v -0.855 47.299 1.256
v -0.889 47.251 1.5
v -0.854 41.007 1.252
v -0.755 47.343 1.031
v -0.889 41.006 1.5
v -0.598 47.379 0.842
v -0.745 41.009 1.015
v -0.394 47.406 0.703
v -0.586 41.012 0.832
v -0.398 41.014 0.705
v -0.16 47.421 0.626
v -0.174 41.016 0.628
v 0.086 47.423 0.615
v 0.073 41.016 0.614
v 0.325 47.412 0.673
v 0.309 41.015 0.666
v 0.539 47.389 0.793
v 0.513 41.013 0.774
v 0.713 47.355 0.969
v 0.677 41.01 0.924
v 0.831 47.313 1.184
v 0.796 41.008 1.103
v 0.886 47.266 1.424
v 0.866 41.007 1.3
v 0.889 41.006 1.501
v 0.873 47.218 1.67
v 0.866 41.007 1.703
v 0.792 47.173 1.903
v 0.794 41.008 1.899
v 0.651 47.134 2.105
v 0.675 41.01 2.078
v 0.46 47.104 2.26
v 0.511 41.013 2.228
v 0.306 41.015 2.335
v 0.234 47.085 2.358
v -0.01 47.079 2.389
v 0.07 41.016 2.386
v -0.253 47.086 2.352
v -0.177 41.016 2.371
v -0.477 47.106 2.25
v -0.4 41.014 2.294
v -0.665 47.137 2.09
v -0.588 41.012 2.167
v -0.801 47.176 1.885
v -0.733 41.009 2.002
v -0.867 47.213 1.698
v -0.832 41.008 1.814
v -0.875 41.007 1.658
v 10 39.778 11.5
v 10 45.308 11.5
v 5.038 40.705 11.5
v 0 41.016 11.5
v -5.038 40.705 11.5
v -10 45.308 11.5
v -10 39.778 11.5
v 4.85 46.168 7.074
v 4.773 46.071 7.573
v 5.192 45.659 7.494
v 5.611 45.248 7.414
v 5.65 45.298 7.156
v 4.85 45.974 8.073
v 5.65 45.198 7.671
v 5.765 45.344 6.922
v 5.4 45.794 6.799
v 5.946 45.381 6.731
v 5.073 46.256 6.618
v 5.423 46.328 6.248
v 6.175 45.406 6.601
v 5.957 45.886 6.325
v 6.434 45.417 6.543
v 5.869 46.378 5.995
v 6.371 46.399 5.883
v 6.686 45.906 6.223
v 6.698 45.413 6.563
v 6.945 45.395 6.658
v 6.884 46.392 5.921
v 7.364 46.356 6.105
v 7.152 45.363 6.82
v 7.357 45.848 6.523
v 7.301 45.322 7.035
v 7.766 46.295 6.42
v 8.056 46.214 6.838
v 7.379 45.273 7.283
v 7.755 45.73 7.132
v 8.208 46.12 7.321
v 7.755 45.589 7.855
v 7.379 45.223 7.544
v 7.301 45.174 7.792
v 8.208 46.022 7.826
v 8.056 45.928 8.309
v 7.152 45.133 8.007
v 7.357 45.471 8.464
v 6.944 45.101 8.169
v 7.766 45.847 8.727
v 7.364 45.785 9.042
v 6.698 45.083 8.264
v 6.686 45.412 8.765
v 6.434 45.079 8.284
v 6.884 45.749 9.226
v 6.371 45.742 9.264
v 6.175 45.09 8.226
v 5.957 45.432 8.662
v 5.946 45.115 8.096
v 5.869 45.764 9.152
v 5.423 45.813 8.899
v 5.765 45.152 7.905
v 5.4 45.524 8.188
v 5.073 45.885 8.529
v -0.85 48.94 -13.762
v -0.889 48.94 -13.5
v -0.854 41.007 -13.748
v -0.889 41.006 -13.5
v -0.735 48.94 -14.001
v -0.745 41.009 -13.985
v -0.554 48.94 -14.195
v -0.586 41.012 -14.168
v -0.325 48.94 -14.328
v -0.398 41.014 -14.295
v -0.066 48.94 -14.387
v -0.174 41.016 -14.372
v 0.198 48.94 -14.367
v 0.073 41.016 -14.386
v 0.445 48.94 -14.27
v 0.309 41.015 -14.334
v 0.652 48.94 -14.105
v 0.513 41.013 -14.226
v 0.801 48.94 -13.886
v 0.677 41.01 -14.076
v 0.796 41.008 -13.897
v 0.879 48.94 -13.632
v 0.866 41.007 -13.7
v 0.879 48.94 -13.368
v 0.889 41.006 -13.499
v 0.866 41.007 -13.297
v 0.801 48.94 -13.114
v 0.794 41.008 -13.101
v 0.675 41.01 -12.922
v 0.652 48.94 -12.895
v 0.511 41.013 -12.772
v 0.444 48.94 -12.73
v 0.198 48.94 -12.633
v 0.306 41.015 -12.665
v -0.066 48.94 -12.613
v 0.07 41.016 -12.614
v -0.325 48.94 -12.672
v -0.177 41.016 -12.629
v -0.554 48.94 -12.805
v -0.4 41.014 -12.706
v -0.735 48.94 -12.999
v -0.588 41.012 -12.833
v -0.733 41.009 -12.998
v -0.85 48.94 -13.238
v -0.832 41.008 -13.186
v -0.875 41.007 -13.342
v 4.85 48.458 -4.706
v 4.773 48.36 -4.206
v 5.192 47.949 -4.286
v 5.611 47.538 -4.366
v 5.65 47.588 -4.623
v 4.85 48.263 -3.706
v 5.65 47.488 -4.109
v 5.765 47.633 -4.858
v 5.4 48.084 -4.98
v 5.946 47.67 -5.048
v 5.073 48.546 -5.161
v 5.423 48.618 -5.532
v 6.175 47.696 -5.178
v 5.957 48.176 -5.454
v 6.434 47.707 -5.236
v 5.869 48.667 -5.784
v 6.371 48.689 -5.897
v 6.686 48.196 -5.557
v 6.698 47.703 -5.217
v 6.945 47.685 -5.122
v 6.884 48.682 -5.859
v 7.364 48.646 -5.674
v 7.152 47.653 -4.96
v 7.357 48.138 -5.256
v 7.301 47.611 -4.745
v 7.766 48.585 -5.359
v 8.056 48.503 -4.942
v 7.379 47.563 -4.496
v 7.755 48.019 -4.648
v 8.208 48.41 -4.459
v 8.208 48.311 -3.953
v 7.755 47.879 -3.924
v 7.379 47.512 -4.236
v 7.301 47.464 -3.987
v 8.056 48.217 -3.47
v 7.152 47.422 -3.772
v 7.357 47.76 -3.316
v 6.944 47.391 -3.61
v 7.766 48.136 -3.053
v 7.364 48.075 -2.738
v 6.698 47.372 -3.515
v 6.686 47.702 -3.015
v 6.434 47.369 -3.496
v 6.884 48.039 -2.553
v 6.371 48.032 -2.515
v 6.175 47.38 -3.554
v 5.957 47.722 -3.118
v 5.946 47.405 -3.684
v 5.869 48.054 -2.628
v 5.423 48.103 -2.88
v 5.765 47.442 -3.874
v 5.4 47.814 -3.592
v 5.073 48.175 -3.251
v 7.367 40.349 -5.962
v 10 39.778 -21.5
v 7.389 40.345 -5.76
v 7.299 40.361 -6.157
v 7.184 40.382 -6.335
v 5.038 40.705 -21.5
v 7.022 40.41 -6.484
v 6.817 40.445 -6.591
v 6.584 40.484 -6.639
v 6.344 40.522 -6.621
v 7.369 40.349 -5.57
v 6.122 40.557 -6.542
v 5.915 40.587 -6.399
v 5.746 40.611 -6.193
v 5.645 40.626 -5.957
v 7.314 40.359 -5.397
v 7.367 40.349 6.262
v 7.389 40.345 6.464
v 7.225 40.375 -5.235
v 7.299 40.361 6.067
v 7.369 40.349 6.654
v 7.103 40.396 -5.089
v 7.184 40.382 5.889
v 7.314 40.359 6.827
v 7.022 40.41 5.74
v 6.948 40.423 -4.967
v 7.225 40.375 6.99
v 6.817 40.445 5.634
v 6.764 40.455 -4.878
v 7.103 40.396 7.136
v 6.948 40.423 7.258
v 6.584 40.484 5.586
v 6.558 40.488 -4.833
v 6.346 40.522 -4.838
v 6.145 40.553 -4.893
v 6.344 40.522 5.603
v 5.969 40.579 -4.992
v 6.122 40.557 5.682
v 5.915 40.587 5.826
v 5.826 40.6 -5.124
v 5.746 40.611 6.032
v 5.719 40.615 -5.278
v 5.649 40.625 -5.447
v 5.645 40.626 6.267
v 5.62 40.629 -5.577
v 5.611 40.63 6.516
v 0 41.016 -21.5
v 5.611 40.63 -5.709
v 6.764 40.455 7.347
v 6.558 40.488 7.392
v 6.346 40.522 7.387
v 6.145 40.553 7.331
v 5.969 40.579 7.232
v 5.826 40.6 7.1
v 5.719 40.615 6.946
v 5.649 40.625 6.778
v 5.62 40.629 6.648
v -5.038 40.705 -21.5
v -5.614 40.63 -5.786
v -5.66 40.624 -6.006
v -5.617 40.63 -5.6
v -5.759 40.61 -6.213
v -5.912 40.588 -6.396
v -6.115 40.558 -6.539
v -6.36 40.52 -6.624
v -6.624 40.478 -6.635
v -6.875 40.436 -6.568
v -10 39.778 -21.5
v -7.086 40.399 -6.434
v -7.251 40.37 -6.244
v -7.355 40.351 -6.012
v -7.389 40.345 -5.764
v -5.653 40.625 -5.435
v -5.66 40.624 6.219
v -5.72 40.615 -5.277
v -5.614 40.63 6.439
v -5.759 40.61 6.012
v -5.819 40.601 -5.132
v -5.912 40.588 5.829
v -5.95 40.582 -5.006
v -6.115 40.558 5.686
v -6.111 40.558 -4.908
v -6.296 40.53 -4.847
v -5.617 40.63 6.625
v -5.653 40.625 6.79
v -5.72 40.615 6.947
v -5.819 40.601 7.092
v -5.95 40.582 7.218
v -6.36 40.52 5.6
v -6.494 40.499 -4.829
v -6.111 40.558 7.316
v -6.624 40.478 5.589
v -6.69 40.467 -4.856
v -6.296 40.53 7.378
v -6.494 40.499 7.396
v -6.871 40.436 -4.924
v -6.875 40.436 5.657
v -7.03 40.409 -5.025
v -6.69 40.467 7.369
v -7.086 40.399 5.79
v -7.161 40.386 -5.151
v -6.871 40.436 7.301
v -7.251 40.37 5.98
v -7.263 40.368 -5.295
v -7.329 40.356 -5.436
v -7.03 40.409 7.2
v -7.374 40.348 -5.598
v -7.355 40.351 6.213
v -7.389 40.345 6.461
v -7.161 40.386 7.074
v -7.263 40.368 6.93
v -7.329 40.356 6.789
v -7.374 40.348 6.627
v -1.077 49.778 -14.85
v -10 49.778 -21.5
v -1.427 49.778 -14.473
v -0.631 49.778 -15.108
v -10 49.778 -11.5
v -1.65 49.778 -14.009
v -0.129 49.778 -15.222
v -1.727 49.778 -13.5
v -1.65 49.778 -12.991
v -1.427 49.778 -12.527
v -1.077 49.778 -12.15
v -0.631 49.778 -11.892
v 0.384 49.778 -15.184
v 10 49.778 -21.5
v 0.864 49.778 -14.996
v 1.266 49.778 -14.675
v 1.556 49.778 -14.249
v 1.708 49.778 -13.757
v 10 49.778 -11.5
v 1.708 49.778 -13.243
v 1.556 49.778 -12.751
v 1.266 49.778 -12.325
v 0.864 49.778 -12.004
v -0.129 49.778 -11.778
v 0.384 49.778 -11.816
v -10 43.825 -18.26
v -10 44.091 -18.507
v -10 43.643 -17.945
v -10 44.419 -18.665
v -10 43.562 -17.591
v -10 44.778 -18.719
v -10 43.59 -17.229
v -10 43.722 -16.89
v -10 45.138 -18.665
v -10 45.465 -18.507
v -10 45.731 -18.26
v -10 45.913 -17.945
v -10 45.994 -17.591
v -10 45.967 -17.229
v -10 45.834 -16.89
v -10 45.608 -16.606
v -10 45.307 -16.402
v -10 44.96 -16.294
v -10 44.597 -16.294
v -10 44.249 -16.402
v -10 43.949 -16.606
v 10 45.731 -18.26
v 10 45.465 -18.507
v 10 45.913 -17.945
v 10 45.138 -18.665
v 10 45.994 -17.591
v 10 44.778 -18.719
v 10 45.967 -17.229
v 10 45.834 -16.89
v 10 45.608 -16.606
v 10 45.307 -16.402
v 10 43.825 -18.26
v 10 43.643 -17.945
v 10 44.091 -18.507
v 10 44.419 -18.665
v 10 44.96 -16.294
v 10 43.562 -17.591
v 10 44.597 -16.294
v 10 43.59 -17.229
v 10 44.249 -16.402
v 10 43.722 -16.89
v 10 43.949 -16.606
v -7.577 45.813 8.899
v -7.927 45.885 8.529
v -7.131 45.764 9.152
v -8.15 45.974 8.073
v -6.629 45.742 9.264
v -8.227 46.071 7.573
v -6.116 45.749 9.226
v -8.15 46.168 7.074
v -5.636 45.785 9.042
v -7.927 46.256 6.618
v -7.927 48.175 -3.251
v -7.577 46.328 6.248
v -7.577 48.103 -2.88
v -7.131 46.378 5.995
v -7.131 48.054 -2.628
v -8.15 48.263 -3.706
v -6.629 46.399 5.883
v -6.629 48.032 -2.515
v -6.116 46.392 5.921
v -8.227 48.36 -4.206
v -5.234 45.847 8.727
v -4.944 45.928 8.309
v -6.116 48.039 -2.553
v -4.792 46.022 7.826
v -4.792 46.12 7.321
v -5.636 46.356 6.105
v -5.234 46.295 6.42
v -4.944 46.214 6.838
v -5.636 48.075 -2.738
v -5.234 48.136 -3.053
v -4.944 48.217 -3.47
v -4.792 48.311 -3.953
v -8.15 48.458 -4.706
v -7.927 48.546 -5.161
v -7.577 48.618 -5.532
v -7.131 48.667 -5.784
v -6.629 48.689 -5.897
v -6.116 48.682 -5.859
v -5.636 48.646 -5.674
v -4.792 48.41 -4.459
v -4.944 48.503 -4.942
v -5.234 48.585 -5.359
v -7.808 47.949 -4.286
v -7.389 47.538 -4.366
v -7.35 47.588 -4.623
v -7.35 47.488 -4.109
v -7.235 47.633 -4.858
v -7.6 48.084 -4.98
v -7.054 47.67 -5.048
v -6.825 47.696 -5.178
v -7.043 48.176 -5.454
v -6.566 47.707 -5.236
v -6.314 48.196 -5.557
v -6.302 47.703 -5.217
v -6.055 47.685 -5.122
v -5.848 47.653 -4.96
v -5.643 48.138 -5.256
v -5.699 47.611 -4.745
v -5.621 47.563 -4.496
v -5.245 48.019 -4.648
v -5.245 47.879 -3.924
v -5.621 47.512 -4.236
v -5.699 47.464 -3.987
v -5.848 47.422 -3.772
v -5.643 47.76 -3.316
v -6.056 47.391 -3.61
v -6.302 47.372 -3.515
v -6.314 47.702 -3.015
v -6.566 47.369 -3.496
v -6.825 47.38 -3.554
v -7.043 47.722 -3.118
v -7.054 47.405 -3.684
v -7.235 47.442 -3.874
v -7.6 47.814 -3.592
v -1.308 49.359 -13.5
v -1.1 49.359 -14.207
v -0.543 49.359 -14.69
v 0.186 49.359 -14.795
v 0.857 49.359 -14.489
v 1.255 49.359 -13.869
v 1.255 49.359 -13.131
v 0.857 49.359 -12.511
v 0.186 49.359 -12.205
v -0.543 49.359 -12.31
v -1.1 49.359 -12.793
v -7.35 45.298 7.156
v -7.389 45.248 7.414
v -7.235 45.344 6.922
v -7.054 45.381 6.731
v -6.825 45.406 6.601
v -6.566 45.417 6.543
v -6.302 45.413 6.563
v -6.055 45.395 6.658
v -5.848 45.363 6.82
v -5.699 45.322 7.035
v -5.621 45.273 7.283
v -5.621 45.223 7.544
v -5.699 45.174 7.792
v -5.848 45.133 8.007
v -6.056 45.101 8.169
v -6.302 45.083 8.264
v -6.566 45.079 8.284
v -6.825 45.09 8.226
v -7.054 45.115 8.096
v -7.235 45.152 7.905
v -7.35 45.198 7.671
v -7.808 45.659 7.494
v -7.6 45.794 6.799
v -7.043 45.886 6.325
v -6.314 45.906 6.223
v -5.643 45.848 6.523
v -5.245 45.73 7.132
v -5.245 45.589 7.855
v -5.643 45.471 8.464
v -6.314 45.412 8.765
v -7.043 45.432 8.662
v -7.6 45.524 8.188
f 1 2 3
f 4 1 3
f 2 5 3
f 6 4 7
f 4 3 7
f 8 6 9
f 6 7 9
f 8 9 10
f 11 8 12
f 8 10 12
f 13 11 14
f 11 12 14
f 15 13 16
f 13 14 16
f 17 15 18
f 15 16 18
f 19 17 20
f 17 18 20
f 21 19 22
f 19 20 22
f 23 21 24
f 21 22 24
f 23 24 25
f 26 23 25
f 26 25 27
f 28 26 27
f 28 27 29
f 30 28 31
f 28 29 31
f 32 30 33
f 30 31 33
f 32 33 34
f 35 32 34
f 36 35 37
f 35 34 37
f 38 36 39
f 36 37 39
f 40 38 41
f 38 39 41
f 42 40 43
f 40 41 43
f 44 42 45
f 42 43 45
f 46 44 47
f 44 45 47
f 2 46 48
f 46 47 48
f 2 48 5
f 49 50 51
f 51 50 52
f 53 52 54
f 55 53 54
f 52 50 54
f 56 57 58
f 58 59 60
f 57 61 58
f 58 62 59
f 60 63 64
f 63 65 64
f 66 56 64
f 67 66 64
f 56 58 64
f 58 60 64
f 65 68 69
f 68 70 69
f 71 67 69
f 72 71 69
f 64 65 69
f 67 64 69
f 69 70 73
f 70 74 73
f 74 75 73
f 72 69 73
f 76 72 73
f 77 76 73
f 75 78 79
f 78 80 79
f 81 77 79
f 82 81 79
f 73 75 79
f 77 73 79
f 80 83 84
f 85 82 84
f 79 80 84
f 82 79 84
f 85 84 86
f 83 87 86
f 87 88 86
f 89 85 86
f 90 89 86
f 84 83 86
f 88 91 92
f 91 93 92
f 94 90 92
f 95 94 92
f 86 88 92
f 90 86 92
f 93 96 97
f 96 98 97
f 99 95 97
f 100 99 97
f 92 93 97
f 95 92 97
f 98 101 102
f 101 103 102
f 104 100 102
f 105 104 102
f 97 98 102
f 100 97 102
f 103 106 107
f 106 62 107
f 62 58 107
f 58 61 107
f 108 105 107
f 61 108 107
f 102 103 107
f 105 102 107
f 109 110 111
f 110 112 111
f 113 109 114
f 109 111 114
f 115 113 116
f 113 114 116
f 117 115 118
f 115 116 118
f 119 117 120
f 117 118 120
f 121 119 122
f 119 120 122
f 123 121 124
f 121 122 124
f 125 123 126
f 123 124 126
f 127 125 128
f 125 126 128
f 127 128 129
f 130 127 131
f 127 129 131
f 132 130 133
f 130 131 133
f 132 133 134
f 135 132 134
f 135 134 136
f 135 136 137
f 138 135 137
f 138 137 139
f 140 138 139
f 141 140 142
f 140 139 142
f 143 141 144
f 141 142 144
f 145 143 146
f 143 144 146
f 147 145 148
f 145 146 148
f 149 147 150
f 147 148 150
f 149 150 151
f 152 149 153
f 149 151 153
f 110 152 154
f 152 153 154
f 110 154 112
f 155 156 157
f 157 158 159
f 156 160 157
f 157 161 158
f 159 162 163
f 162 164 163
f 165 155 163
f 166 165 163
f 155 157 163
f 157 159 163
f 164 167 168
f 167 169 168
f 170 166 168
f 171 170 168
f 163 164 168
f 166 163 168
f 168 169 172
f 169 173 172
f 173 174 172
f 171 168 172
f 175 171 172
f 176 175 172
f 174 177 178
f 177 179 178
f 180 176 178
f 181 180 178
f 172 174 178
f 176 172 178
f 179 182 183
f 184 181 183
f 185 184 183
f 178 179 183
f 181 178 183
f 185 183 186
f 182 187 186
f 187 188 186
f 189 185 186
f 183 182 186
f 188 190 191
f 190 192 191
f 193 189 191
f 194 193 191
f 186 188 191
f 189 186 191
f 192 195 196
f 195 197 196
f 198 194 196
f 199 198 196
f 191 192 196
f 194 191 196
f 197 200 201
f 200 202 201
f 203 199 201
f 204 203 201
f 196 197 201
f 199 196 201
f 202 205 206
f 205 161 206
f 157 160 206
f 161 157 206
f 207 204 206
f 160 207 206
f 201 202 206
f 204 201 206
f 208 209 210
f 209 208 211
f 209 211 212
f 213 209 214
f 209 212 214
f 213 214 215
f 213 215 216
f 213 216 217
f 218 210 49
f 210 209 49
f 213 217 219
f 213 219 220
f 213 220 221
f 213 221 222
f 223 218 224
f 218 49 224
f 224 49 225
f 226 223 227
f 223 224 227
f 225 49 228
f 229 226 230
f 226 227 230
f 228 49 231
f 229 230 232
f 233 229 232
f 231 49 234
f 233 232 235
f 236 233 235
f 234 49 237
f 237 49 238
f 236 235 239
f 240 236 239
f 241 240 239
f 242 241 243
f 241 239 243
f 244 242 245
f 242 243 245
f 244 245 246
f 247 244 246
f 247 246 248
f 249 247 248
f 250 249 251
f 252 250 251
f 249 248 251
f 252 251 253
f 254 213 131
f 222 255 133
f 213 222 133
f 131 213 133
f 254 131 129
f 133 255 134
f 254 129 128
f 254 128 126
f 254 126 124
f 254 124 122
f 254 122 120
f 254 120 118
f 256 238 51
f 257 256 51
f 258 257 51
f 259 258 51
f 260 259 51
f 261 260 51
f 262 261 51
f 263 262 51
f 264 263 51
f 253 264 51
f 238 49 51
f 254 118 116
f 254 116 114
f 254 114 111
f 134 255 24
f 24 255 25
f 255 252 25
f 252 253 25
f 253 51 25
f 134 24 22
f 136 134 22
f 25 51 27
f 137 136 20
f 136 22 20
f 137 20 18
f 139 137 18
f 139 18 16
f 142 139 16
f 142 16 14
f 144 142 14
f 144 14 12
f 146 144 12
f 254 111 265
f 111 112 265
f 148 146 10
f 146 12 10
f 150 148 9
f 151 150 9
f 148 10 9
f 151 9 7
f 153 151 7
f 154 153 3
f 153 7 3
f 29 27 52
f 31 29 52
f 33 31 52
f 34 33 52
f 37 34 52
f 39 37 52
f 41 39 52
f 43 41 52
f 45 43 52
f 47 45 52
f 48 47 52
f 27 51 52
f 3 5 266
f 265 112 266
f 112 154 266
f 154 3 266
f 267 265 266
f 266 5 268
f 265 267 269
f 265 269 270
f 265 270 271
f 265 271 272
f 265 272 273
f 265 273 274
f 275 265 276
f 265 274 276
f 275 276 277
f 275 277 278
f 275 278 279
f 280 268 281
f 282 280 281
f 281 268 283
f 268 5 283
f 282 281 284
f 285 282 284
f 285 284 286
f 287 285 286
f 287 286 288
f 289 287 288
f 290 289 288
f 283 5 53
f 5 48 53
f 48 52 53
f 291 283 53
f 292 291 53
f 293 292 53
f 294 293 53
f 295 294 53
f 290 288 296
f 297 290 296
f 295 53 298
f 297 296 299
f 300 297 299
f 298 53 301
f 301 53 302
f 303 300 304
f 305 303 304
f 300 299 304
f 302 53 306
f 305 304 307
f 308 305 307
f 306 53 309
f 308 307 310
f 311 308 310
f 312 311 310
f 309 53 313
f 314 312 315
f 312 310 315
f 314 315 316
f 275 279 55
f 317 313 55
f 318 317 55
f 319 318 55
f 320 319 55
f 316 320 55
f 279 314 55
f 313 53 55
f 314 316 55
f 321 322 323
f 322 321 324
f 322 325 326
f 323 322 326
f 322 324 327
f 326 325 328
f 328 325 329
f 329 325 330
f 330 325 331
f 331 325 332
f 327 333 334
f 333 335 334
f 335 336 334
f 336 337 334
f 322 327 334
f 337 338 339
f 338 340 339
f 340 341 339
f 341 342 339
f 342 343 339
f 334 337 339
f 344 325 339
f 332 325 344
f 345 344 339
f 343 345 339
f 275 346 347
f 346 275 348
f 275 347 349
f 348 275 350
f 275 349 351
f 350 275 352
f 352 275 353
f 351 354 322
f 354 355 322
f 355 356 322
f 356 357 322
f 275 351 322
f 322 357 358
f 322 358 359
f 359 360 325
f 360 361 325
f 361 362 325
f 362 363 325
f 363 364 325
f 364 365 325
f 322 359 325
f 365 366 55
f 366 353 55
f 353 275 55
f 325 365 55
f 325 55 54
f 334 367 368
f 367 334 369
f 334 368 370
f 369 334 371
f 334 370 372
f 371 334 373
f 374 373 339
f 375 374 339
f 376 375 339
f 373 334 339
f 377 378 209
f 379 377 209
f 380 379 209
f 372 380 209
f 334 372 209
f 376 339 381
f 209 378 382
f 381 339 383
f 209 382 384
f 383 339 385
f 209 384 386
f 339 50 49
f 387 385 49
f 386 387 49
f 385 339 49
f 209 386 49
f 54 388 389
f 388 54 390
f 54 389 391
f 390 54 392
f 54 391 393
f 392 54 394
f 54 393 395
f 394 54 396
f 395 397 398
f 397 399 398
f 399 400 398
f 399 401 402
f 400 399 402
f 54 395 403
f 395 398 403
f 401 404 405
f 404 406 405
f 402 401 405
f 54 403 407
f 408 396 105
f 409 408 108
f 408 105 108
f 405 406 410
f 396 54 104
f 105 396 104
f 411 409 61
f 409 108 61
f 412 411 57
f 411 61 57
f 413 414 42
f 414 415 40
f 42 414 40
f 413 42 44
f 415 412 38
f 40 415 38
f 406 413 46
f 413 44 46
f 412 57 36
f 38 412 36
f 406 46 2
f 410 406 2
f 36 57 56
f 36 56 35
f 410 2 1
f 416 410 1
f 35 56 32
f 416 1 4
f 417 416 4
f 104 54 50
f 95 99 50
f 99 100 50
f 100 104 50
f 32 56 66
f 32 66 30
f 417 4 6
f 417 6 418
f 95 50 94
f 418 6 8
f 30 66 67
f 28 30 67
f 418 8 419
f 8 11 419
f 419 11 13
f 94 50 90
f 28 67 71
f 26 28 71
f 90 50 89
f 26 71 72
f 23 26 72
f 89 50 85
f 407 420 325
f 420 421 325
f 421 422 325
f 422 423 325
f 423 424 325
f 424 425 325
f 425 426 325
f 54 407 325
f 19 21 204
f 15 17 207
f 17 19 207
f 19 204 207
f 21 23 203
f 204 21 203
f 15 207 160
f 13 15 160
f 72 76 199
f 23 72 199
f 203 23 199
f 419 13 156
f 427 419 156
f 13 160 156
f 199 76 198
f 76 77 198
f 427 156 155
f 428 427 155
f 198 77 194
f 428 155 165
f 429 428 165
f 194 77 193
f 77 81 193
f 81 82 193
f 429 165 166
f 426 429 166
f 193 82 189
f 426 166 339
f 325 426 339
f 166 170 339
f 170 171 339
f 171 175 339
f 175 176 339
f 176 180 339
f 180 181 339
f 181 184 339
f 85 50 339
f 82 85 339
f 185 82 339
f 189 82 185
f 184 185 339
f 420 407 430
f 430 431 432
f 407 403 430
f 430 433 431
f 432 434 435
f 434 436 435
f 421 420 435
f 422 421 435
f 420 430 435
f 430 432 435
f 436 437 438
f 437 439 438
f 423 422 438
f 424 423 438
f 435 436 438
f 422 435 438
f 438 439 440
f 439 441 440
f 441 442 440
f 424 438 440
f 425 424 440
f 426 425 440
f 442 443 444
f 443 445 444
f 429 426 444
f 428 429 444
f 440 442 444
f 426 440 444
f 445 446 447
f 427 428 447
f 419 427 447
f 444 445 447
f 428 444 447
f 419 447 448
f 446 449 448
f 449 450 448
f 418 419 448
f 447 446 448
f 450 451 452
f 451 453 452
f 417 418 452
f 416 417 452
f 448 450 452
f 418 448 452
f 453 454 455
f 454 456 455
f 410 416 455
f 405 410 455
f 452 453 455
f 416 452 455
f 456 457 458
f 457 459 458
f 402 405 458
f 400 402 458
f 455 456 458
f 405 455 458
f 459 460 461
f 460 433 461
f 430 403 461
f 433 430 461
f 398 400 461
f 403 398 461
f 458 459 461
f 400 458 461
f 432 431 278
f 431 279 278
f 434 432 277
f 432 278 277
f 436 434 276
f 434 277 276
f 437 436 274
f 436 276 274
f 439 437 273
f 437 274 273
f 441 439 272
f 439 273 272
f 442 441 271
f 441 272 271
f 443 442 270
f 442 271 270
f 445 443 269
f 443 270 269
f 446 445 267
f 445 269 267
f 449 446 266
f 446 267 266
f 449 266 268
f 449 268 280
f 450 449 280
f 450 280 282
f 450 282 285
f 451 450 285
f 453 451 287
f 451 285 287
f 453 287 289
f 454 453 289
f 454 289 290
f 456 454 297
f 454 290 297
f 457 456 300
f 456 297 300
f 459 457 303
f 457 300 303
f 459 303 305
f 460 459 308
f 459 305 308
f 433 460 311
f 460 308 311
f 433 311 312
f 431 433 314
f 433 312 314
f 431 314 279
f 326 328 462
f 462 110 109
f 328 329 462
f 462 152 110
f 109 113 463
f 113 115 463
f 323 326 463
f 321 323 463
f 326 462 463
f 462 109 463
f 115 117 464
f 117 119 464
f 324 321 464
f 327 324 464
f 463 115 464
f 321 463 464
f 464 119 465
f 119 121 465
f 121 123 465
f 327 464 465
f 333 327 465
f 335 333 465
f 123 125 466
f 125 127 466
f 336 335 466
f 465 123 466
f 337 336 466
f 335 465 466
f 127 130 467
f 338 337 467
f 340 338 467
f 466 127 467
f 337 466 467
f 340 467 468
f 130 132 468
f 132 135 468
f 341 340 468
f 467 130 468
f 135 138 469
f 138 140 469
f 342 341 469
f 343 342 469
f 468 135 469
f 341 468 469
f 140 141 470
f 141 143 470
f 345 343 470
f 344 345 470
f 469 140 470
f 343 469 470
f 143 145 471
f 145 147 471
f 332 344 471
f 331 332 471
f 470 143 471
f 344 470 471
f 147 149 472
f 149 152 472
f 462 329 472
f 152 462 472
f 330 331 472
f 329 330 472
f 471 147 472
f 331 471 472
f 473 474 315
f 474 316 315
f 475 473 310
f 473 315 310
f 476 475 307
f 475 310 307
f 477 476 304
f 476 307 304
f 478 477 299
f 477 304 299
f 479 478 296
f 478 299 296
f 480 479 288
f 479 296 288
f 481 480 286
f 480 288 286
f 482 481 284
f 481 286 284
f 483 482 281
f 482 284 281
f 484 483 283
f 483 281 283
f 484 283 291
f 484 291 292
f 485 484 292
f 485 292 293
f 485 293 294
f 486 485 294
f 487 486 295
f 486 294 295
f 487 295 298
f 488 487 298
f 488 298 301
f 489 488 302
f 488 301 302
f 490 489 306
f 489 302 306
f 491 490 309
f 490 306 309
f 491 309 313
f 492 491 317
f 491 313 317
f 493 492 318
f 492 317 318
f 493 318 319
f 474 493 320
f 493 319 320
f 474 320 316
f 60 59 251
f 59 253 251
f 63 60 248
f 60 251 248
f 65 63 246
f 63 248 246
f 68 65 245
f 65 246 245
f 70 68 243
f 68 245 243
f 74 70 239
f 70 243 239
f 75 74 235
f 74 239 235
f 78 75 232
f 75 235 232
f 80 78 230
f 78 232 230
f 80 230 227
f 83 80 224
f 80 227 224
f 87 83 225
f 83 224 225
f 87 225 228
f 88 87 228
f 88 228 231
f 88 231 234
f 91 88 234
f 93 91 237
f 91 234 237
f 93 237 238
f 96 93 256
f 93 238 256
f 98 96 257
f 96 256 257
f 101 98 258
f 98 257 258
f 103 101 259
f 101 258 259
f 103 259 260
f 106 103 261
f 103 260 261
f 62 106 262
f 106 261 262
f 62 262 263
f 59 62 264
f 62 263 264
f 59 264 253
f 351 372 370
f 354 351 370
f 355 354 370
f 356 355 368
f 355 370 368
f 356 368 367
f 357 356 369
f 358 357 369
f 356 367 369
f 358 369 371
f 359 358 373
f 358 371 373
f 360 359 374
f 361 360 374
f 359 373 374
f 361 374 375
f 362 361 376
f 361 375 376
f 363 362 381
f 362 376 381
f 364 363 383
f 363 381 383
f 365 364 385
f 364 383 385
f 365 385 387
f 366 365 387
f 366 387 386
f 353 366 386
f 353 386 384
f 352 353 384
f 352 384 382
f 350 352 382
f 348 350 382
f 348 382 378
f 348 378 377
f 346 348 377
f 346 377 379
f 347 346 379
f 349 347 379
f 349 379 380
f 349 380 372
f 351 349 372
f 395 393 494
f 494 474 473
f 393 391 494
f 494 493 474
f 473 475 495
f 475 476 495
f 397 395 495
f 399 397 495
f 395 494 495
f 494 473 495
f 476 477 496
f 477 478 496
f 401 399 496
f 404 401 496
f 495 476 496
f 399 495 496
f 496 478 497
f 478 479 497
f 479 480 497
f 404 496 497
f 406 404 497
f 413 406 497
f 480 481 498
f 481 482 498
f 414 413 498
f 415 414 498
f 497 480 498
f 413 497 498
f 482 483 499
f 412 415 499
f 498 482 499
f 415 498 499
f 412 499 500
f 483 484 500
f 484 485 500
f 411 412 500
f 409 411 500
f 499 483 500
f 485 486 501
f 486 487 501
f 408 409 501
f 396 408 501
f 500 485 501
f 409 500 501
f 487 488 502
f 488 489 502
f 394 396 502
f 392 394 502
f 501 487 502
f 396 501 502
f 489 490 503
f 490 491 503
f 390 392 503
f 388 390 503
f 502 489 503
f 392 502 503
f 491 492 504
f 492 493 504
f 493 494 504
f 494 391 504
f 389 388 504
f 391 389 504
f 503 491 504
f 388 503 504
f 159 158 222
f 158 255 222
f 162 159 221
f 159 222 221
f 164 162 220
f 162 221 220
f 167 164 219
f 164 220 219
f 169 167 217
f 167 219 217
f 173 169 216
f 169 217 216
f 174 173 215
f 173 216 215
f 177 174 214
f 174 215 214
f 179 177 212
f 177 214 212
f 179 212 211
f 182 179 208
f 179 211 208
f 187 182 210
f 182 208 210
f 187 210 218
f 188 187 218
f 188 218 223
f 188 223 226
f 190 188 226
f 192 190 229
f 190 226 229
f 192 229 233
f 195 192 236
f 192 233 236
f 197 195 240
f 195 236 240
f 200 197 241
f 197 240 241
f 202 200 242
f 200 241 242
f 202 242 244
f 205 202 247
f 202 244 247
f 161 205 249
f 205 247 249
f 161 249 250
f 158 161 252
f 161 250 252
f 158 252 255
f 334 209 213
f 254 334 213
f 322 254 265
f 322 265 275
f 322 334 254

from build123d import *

# Parameters (mm, degrees)
BOSS_EXTRUDE1_DEPTH             = 11.5
F_2_56_TAPPED_HOLE3_D           = 1.778
F_2_56_TAPPED_HOLE3_CSINK_D     = 3.4544
F_2_56_TAPPED_HOLE3_CSINK_ANGLE = 90
CUT_EXTRUDE1_DEPTH              = 10
F_2_56_TAPPED_HOLE1_D           = 1.778
F_2_56_TAPPED_HOLE1_CSINK_D     = 3.4544
F_2_56_TAPPED_HOLE1_CSINK_ANGLE = 90
BOSS_EXTRUDE2_DEPTH             = 10
F_2_56_TAPPED_HOLE4_D           = 1.778
F_2_56_TAPPED_HOLE4_CSINK_D     = 3.4544
F_2_56_TAPPED_HOLE4_CSINK_ANGLE = 90
F_2_CLEARANCE_HOLE1_D           = 2.4384


with BuildPart() as part:
    # Sketch1 → Boss-Extrude1 (new body, symmetric)
    with BuildSketch(Plane.XY):
        with BuildLine():
            Line((-10, 39.778288752), (-10, 51.016))
            Line((-10, 51.016), (10, 51.016))
            Line((10, 51.016), (10, 39.778288752))
            ThreePointArc((10, 39.778288752), (0, 41.016), (-10, 39.778288752))
        make_face()
    extrude(amount=BOSS_EXTRUDE1_DEPTH, both=True)

    # #2-56 Tapped Hole3 (through all)
    with Locations(Plane(origin=(0, 51.016, 0), x_dir=(1, 0, 0), z_dir=(0, 1, 0))):
        with Locations((0, -1.5)):
            CounterSinkHole(F_2_56_TAPPED_HOLE3_D / 2, F_2_56_TAPPED_HOLE3_CSINK_D / 2, counter_sink_angle=F_2_56_TAPPED_HOLE3_CSINK_ANGLE)

    # Sketch2 → Cut-Extrude1 (cut, symmetric)
    with BuildSketch(Plane(origin=(0, 0, 0), x_dir=(0, 0, -1), z_dir=(1, 0, 0))):
        Polygon((-11.5, 45.307541641), (11.5, 49.778288752), (11.5, 51.016), (-11.5, 51.016), align=None)
    extrude(amount=CUT_EXTRUDE1_DEPTH, both=True, mode=Mode.SUBTRACT)

    # #2-56 Tapped Hole1 (through all)
    with Locations(Plane(origin=(0, 45.811969283, 8.904944751), x_dir=(1, 0, 0), z_dir=(0, 0.981627183, 0.190808995))):
        with Locations((6.5, 1.356373894), (6.5, 13.356373894), (-6.5, 13.356373894), (-6.5, 1.356373894)):
            CounterSinkHole(F_2_56_TAPPED_HOLE1_D / 2, F_2_56_TAPPED_HOLE1_CSINK_D / 2, counter_sink_angle=F_2_56_TAPPED_HOLE1_CSINK_ANGLE)

    # Sketch5 → Boss-Extrude2 (add)
    with BuildSketch(Plane(origin=(0, 0, -11.5), x_dir=(-1, 0, 0), z_dir=(0, 0, -1))):
        with BuildLine():
            Line((10, 39.778288752), (10, 49.778288752))
            Line((10, 49.778288752), (-10, 49.778288752))
            Line((-10, 49.778288752), (-10, 39.778288752))
            ThreePointArc((-10, 39.778288752), (0, 41.016), (10, 39.778288752))
        make_face()
    extrude(amount=BOSS_EXTRUDE2_DEPTH)

    # #2-56 Tapped Hole4 (through all)
    with Locations(Plane(origin=(0, 49.778288752, 0), x_dir=(1, 0, 0), z_dir=(0, 1, 0))):
        with Locations((0, 13.5)):
            CounterSinkHole(F_2_56_TAPPED_HOLE4_D / 2, F_2_56_TAPPED_HOLE4_CSINK_D / 2, counter_sink_angle=F_2_56_TAPPED_HOLE4_CSINK_ANGLE)

    # #2 Clearance Hole1 (through all)
    with Locations(Plane.ZY.offset(10)):
        with Locations((-17.5, 44.778288752)):
            Hole(F_2_CLEARANCE_HOLE1_D / 2)


solid = part.part
